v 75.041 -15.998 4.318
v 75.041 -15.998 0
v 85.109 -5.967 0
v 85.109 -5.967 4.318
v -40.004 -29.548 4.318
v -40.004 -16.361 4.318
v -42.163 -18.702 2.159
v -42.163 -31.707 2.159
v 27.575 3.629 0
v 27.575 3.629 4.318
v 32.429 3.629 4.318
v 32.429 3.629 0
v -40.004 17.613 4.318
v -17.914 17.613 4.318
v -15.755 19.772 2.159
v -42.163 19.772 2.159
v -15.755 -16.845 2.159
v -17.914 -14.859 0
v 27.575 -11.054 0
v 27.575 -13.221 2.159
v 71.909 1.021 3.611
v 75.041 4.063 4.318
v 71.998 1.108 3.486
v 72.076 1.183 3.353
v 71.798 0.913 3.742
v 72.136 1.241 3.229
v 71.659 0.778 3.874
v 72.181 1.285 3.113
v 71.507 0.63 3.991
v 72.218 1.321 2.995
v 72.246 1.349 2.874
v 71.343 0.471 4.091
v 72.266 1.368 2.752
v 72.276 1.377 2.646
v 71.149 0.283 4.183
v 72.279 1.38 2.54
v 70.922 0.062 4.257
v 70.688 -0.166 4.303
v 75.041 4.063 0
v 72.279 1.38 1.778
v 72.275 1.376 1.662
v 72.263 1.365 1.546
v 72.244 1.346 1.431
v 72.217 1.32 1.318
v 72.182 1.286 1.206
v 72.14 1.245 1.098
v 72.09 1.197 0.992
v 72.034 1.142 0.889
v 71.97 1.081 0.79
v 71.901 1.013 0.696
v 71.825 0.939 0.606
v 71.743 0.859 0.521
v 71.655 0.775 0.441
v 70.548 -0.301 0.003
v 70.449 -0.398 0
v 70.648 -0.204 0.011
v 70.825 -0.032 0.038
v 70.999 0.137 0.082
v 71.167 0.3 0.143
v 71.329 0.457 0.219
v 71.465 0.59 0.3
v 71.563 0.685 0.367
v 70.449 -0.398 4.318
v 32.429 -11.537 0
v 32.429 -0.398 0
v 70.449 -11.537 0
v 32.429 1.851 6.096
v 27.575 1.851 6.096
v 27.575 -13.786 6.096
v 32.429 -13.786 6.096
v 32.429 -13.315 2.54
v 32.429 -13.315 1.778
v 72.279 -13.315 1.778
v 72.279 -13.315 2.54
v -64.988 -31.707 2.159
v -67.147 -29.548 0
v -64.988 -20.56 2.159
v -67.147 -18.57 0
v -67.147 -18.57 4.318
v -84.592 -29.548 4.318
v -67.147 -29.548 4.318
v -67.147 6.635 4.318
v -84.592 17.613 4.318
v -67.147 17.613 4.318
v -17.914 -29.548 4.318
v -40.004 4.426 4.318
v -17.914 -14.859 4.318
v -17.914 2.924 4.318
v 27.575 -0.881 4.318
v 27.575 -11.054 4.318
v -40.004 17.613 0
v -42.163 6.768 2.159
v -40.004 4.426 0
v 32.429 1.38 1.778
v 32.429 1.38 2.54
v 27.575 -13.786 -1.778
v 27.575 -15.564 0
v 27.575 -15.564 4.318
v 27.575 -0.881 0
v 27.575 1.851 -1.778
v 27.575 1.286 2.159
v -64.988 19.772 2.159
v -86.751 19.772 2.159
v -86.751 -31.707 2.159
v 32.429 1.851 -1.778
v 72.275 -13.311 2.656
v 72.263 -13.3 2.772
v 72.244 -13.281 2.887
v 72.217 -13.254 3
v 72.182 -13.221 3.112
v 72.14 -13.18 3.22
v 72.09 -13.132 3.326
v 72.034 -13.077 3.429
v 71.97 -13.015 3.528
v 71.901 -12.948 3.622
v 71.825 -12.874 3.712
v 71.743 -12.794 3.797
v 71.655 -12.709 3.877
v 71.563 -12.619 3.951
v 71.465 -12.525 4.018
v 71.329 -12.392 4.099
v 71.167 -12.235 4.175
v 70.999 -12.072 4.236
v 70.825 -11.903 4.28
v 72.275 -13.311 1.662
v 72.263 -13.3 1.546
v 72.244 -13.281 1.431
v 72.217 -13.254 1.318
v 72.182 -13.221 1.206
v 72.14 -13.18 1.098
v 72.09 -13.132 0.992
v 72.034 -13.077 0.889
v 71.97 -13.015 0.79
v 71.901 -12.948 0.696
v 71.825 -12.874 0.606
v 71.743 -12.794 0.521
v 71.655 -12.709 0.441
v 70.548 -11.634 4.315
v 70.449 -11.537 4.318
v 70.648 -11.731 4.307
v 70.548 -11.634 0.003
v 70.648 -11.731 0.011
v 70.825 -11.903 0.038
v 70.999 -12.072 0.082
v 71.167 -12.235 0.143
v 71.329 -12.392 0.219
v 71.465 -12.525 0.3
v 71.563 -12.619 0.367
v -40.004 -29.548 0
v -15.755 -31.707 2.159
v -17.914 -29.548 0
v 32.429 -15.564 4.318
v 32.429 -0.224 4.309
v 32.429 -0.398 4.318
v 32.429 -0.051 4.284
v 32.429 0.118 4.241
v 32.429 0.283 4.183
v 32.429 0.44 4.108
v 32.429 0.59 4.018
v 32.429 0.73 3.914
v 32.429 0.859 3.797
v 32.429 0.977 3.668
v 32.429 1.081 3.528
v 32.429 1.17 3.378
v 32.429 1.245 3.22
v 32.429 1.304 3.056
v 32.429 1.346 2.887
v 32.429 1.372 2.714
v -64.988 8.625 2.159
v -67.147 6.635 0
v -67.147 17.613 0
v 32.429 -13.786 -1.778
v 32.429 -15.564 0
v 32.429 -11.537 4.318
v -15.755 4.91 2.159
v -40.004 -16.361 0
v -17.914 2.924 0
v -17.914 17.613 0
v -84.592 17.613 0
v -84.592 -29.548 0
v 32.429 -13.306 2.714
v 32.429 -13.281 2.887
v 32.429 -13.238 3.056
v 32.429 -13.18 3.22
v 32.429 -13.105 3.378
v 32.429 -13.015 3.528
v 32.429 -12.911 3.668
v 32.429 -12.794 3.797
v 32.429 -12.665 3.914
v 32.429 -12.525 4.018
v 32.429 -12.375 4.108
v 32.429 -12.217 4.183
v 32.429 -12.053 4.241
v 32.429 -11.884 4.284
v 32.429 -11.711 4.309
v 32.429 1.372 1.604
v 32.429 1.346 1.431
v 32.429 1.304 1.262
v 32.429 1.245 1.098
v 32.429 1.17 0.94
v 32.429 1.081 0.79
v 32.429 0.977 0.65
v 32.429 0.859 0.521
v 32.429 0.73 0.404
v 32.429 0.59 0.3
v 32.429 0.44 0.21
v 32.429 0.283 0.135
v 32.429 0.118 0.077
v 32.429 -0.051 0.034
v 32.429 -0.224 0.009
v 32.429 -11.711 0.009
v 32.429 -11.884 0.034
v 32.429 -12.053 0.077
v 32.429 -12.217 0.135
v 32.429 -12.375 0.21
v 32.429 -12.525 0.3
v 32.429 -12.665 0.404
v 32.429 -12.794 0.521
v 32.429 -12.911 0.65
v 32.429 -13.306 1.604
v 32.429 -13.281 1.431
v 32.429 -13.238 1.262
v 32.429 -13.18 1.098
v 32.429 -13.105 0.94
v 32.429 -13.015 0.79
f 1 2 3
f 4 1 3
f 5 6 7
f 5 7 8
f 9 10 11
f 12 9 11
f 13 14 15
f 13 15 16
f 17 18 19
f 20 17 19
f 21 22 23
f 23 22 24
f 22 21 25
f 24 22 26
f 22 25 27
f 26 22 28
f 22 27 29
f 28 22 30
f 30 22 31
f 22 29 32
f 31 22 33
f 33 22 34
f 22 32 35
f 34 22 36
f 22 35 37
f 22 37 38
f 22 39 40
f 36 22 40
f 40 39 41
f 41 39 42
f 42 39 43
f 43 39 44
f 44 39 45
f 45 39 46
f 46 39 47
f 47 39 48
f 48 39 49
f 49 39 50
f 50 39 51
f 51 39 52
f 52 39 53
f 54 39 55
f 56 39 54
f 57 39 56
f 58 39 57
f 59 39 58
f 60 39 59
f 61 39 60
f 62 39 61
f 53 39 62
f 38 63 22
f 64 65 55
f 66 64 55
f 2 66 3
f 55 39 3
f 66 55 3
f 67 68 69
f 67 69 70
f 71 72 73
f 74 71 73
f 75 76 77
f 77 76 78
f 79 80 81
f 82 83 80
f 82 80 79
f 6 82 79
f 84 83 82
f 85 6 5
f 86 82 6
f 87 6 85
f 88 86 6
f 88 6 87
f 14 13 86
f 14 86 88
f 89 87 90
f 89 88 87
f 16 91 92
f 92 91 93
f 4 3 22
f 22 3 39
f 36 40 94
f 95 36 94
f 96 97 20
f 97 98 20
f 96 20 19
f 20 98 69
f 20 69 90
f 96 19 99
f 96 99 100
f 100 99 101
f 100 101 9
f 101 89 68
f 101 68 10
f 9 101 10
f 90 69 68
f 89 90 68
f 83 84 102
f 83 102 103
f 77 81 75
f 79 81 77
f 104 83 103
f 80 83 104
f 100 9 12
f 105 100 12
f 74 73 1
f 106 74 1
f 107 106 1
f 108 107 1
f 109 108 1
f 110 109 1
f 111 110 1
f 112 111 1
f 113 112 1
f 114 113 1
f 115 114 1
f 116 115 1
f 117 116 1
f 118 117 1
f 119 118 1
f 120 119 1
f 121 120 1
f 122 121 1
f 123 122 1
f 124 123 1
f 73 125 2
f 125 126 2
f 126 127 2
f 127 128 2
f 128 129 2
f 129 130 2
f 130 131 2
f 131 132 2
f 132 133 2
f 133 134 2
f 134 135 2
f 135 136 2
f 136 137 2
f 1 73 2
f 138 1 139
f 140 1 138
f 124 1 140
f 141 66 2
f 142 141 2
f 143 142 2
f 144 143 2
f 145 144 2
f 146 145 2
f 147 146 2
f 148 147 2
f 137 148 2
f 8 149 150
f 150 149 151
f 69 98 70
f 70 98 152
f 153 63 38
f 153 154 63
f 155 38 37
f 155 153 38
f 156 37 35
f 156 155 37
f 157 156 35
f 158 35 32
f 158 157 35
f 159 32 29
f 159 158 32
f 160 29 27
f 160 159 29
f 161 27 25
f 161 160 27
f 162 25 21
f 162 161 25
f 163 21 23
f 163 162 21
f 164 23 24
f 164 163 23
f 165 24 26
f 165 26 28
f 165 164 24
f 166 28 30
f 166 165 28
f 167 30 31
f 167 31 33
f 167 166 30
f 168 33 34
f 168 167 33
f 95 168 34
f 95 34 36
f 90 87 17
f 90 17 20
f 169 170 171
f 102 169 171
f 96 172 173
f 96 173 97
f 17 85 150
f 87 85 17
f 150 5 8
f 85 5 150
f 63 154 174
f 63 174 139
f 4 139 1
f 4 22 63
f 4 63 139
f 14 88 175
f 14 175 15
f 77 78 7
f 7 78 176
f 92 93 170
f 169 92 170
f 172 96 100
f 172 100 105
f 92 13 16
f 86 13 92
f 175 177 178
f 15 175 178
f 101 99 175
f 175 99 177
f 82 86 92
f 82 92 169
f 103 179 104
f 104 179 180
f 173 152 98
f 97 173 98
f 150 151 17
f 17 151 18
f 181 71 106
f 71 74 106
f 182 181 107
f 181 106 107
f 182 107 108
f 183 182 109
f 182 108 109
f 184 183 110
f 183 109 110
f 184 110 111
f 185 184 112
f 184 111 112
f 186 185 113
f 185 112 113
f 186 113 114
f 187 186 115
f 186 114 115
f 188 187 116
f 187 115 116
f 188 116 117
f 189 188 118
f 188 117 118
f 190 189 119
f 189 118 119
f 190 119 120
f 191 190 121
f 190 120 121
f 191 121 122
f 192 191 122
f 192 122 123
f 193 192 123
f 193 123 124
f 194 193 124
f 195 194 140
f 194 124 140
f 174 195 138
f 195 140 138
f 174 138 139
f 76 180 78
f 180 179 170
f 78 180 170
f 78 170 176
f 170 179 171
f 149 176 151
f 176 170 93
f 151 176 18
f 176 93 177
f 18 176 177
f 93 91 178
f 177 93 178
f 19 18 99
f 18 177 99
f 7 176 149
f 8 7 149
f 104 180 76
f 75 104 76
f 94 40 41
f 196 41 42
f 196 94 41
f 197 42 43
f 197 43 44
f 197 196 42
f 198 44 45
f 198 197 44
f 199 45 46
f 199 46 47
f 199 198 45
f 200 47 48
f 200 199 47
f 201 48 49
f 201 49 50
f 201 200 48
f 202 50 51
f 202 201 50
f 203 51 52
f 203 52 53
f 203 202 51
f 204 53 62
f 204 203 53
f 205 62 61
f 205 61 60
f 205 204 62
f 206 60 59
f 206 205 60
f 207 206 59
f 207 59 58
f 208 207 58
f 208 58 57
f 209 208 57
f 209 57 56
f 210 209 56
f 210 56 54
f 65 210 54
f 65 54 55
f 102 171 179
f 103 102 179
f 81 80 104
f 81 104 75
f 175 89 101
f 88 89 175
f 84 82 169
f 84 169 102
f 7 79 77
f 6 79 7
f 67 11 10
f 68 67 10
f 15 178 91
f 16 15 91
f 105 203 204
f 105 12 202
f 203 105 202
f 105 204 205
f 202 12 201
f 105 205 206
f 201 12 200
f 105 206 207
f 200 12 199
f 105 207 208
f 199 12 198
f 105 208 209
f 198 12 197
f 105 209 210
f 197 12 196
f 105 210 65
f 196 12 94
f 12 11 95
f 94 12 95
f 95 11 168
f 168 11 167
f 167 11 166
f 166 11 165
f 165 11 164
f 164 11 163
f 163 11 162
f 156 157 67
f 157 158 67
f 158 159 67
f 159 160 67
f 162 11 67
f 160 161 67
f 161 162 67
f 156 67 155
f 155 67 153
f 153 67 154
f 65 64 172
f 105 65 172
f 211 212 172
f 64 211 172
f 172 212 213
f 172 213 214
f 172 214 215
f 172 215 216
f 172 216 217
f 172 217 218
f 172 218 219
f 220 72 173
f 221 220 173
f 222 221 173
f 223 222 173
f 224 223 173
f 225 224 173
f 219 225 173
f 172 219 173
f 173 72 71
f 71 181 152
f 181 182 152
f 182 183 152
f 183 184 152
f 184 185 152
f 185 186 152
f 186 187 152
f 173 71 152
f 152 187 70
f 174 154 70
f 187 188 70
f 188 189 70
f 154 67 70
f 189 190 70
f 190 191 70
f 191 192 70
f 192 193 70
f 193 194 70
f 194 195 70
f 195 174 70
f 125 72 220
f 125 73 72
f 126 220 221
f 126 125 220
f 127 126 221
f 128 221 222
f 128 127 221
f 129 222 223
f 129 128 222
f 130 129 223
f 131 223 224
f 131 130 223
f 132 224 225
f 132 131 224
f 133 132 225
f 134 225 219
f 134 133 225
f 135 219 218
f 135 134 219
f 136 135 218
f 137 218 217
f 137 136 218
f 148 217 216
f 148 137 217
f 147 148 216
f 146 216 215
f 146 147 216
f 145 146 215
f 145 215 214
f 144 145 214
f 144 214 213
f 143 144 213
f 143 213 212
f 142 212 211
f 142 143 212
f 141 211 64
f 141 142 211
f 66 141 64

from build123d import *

# Parameters (mm, degrees)
F2_DEPTH = 4.318
F3_SIZE  = 2.15899
F5_DEPTH = 1.778
F7_DEPTH = 1.778
F8_R     = 1.778
F9_SIZE  = 1.778


# Not quite as in the source:
# - a fillet or chamfer is up to 0.001 mm smaller than in the source, because OpenCascade refuses the exact size


with BuildPart() as f2:
    # F0 (on Top) → F2 (new body)
    with BuildSketch(Plane.XY):
        Polygon((27.5745280087, 3.6292271689), (27.5745280087, 1.2858584523), (27.5745280087, -13.2207097486), (27.5745280087, -15.5640784651), (32.4286483228, -15.5640784651), (32.4286483228, -13.3150536567), (32.4286483228, 1.3802023605), (32.4286483228, 3.6292271689), align=None)
        Polygon((72.2789242864, 1.3802023605), (32.4286483228, 1.3802023605), (32.4286483228, -13.3150536567), (72.2789242864, -13.3150536567), (75.0406160951, -15.9978345037), (85.1087123156, -5.9674256481), (75.0406160951, 4.0629832074), align=None)
        Polygon((-64.9878308177, 19.7724616155), (-86.7510214448, 19.7724616155), (-86.7510214448, -31.7073129117), (-64.9878308177, -31.7073129117), (-64.9878308177, -20.5603092909), (-42.1630144119, -18.7024753541), (-42.1630144119, -31.7073129117), (-15.7552305609, -31.7073129117), (-15.7552305609, -16.8446414173), (27.5745280087, -13.2207097486), (27.5745280087, 1.2858584523), (-15.7552305609, 4.909790121), (-15.7552305609, 19.7724616155), (-42.1630144119, 19.7724616155), (-42.1630144119, 6.7676240578), (-64.9878308177, 8.6254579946), align=None)
    extrude(amount=F2_DEPTH)

    # F3 (size 2.159 in the source; OpenCascade refuses exactly that, so slightly less here)
    f3_edges = [f2.edges().sort_by_distance(p)[0] for p in [
        (-53.575423, -19.631392, 4.318),
        (-42.163014, -25.204894, 4.318),
        (-28.959122, -31.707313, 4.318),
        (-15.755231, -24.275977, 4.318),
        (5.909649, -15.032676, 4.318),
        (5.909649, 3.097824, 4.318),
        (-15.755231, 12.341126, 4.318),
        (-28.959122, 19.772462, 4.318),
        (-42.163014, 13.270043, 4.318),
        (-53.575423, 7.696541, 4.318),
        (-64.987831, 14.19896, 4.318),
        (-75.869426, 19.772462, 4.318),
        (-86.751021, -5.967426, 4.318),
        (-75.869426, -31.707313, 4.318),
        (-64.987831, -26.133811, 4.318),
        (-28.959122, -31.707313, 0),
        (-15.755231, -24.275977, 0),
        (5.909649, -15.032676, 0),
        (-42.163014, -25.204894, 0),
        (-53.575423, -19.631392, 0),
        (-75.869426, -31.707313, 0),
        (-64.987831, -26.133811, 0),
        (-86.751021, -5.967426, 0),
        (-75.869426, 19.772462, 0),
        (-64.987831, 14.19896, 0),
        (-53.575423, 7.696541, 0),
        (-15.755231, 12.341126, 0),
        (5.909649, 3.097824, 0),
        (-42.163014, 13.270043, 0),
        (-28.959122, 19.772462, 0),
    ]]
    chamfer(f3_edges, length=F3_SIZE)

    # F4 (on face) → F5 (join)
    with BuildSketch(Plane.XY.offset(4.318)):
        Polygon((32.4286483228, 3.6292271689), (27.5745280087, 3.6292271689), (27.5745280087, 1.2858584523), (27.5745280087, -0.8806694518), (27.5745280087, -11.0541818444), (27.5745280087, -13.2207097486), (27.5745280087, -15.5640784651), (32.4286483228, -15.5640784651), (32.4286483228, -13.3150536567), (32.4286483228, 1.3802023605), align=None)
    extrude(amount=F5_DEPTH)

    # F6 (on face) → F7 (join)
    with BuildSketch(Plane(origin=(0, 0, 0), x_dir=(1, 0, 0), z_dir=(0, 0, -1))):
        Polygon((32.4286483228, 15.5640784651), (27.5745280087, 15.5640784651), (27.5745280087, 11.0541818444), (27.5745280087, 0.8806694518), (27.5745280087, -3.6292271689), (32.4286483228, -3.6292271689), (32.4286483228, -1.3802023605), (32.4286483228, 13.3150536567), align=None)
    extrude(amount=F7_DEPTH)

    # F8
    f8_edges = [f2.edges().sort_by_distance(p)[0] for p in [
        (52.353786, 1.380202, 0),
        (52.353786, -13.315054, 0),
        (52.353786, 1.380202, 4.318),
        (52.353786, -13.315054, 4.318),
    ]]
    fillet(f8_edges, radius=F8_R)

    # F9
    f9_edges = [f2.edges().sort_by_distance(p)[0] for p in [
        (30.001588, -15.564078, -1.778),
        (30.001588, -15.564078, 6.096),
        (30.001588, 3.629227, 6.096),
        (30.001588, 3.629227, -1.778),
    ]]
    chamfer(f9_edges, length=F9_SIZE)


solid = f2.part
